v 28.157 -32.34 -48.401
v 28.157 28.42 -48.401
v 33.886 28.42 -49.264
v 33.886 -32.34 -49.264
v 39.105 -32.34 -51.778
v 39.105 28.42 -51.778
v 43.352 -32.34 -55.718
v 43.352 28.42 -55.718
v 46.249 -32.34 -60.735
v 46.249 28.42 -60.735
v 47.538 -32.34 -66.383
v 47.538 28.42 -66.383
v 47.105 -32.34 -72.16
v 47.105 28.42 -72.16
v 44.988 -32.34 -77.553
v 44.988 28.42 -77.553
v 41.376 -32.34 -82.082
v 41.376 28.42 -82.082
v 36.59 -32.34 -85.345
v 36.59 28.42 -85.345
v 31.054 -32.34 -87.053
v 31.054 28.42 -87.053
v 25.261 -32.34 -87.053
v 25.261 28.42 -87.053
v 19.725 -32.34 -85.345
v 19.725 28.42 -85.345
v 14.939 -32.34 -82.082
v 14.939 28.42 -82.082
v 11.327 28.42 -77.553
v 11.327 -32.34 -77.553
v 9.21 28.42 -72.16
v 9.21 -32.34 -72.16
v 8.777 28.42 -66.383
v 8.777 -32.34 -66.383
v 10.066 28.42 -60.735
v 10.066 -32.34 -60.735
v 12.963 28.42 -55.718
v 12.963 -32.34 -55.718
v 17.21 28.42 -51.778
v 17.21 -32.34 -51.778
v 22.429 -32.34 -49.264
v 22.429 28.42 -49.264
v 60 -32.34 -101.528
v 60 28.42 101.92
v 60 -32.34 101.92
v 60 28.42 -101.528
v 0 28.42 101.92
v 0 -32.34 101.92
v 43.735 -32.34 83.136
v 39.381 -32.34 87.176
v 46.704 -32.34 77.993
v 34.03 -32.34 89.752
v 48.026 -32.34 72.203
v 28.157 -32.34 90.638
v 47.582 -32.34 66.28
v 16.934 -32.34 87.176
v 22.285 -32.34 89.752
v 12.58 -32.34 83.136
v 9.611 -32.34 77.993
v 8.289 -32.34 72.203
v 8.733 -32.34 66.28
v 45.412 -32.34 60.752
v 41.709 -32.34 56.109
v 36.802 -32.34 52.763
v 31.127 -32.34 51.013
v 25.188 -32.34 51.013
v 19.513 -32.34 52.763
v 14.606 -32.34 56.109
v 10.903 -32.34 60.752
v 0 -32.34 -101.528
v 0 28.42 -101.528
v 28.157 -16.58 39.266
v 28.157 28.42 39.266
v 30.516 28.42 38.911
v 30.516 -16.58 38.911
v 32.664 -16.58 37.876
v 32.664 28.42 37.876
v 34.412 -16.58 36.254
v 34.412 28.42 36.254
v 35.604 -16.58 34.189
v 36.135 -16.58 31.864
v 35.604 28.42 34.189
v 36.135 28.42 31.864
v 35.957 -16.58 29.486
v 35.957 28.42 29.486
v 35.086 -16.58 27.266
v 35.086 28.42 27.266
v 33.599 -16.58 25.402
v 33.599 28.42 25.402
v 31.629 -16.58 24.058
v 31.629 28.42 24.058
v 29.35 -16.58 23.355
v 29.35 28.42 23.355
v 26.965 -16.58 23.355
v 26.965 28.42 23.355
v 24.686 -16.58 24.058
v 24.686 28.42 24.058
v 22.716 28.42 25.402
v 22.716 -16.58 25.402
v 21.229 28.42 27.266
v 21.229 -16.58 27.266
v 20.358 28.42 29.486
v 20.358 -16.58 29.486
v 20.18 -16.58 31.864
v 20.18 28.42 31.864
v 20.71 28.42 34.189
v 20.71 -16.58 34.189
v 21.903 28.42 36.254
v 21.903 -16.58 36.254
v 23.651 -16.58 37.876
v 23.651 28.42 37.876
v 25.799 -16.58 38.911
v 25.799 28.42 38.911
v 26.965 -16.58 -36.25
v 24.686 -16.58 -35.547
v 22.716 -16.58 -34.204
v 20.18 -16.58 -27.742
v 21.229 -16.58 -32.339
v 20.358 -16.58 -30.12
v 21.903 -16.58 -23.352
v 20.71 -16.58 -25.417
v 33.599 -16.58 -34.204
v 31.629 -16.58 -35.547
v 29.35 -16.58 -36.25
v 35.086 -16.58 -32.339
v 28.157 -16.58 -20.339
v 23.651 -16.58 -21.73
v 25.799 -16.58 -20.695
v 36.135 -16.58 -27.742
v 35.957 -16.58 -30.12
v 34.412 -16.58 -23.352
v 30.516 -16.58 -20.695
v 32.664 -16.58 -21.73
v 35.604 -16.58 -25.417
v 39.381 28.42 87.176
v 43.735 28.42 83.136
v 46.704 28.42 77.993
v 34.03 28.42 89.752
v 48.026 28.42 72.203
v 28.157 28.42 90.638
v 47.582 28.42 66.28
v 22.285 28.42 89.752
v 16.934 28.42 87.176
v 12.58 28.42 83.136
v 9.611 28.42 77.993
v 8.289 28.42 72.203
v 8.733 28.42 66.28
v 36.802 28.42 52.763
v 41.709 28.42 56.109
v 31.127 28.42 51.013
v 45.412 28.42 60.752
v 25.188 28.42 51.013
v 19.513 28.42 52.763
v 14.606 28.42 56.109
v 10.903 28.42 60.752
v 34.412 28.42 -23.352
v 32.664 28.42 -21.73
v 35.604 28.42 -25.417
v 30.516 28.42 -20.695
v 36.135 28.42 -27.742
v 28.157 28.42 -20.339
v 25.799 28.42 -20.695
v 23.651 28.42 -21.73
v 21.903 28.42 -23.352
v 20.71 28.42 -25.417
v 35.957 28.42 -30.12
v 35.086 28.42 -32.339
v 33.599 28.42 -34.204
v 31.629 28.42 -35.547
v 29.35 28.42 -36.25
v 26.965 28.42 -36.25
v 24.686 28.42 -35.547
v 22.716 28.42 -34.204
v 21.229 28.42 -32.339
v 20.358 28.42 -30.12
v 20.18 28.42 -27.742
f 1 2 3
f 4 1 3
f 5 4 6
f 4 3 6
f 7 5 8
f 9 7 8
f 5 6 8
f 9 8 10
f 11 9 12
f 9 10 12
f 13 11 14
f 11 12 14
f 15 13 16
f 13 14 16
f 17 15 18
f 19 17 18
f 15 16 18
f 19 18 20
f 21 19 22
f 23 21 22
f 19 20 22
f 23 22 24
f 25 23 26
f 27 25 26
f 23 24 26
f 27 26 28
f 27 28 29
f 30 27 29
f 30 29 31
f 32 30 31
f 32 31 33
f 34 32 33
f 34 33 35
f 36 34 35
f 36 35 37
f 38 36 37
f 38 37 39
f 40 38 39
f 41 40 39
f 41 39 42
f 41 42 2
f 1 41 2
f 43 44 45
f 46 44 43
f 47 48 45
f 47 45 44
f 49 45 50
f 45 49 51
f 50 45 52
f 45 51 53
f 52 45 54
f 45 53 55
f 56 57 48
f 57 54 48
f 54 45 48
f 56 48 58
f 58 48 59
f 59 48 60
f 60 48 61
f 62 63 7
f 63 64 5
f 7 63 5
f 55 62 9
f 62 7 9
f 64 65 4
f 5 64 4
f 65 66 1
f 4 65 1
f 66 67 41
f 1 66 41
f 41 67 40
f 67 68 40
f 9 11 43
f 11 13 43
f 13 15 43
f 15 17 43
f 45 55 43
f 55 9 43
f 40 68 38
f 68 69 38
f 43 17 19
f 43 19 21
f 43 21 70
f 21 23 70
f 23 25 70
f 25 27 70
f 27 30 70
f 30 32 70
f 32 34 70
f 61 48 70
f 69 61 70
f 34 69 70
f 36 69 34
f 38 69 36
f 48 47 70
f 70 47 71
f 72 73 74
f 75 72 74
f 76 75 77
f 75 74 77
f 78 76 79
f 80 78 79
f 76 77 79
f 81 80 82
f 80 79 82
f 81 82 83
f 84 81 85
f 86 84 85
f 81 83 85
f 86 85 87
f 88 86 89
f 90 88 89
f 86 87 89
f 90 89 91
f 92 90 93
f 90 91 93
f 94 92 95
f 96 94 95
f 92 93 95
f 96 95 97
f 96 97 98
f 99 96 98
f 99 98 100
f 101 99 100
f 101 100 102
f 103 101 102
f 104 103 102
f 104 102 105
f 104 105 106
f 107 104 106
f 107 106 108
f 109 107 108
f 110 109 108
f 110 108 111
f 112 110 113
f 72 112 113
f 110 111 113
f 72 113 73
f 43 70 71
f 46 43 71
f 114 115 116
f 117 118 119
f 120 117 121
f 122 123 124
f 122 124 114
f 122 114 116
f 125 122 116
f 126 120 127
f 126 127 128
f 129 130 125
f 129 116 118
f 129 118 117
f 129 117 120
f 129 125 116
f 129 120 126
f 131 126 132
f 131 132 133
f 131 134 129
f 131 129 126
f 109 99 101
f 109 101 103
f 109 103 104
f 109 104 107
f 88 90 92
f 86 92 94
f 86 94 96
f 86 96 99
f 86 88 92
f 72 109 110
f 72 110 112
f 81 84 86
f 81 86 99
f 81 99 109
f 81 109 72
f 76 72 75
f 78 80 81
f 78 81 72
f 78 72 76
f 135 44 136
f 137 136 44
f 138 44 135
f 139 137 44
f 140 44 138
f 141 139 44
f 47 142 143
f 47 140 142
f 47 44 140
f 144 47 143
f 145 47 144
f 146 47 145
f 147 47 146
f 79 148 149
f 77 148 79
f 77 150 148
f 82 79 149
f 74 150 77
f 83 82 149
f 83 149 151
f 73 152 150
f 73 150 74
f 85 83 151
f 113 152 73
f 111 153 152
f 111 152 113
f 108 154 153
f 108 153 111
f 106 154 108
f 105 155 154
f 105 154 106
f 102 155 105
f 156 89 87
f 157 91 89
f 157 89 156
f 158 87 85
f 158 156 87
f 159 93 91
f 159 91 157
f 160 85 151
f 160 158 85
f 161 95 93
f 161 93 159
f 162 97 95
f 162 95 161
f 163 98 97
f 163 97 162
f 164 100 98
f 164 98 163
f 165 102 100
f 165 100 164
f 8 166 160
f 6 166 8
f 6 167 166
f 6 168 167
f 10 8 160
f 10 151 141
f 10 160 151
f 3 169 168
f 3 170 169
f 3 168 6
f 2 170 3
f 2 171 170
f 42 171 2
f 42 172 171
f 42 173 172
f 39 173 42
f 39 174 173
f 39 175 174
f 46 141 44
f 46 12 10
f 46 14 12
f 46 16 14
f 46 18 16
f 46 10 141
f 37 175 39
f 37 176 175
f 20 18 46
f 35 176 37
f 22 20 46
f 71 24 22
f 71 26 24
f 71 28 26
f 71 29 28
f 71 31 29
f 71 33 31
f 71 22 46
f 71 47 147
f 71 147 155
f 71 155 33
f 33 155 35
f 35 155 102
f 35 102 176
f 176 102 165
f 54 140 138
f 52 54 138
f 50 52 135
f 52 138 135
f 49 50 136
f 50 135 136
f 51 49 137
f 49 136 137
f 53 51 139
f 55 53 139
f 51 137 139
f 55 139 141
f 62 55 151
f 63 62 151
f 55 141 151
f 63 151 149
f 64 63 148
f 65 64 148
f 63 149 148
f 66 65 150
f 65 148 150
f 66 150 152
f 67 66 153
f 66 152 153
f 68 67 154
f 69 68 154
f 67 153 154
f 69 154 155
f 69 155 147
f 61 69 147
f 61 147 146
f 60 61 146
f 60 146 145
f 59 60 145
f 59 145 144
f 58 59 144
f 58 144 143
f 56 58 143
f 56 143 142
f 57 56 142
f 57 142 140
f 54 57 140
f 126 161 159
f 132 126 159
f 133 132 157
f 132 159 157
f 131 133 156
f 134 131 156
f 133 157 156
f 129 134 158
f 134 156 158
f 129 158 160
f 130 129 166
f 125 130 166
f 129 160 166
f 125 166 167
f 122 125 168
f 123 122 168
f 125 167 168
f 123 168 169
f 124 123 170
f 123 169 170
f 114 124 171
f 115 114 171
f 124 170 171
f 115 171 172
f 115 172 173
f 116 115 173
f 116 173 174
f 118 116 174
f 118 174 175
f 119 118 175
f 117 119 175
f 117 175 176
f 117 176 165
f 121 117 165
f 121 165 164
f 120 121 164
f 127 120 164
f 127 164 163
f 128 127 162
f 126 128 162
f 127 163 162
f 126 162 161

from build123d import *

# Parameters (mm, degrees)
SKETCH1_W           = 203.448651213
SKETCH1_H           = 60.760194486
BOSS_EXTRUDE1_DEPTH = 60
SKETCH2_R           = 19.434497102
SKETCH2_R_2         = 19.923805808
CUT_EXTRUDE2_DEPTH  = 80
SKETCH3_R           = 8
CUT_EXTRUDE3_DEPTH  = 45


with BuildPart() as part:
    # Sketch1 → Boss-Extrude1 (new body)
    with BuildSketch(Plane(origin=(0, 0, 0), x_dir=(0, 0, -1), z_dir=(1, 0, 0))):
        with Locations((-0.196000627, -1.960006274)):
            Rectangle(SKETCH1_W, SKETCH1_H)
    extrude(amount=BOSS_EXTRUDE1_DEPTH)

    # Sketch2 → Cut-Extrude2 (cut)
    with BuildSketch(Plane(origin=(0, 28.420090969, 0), x_dir=(-1, 0, 0), z_dir=(0, 1, 0))):
        with Locations(Location((-28.157475654, -67.835345713, 0), (0, 0, 90))):  # turned: the seam where the file's is
            Circle(SKETCH2_R)
        with Locations(Location((-28.157475654, 70.713811049, 0), (0, 0, 90))):  # turned: the seam where the file's is
            Circle(SKETCH2_R_2)
    extrude(amount=-CUT_EXTRUDE2_DEPTH, mode=Mode.SUBTRACT)

    # Sketch3 → Cut-Extrude3 (cut)
    with BuildSketch(Plane(origin=(0, 28.420090969, 0), x_dir=(1, 0, 0), z_dir=(0, 1, 0))):
        with Locations(Location((28.157475654, 28.339432247, 0), (0, 0, 270))):  # turned: the seam where the file's is
            Circle(SKETCH3_R)
        with Locations(Location((28.157475654, -31.26607036, 0), (0, 0, 270))):  # turned: the seam where the file's is
            Circle(SKETCH3_R)
    extrude(amount=-CUT_EXTRUDE3_DEPTH, mode=Mode.SUBTRACT)


solid = part.part
